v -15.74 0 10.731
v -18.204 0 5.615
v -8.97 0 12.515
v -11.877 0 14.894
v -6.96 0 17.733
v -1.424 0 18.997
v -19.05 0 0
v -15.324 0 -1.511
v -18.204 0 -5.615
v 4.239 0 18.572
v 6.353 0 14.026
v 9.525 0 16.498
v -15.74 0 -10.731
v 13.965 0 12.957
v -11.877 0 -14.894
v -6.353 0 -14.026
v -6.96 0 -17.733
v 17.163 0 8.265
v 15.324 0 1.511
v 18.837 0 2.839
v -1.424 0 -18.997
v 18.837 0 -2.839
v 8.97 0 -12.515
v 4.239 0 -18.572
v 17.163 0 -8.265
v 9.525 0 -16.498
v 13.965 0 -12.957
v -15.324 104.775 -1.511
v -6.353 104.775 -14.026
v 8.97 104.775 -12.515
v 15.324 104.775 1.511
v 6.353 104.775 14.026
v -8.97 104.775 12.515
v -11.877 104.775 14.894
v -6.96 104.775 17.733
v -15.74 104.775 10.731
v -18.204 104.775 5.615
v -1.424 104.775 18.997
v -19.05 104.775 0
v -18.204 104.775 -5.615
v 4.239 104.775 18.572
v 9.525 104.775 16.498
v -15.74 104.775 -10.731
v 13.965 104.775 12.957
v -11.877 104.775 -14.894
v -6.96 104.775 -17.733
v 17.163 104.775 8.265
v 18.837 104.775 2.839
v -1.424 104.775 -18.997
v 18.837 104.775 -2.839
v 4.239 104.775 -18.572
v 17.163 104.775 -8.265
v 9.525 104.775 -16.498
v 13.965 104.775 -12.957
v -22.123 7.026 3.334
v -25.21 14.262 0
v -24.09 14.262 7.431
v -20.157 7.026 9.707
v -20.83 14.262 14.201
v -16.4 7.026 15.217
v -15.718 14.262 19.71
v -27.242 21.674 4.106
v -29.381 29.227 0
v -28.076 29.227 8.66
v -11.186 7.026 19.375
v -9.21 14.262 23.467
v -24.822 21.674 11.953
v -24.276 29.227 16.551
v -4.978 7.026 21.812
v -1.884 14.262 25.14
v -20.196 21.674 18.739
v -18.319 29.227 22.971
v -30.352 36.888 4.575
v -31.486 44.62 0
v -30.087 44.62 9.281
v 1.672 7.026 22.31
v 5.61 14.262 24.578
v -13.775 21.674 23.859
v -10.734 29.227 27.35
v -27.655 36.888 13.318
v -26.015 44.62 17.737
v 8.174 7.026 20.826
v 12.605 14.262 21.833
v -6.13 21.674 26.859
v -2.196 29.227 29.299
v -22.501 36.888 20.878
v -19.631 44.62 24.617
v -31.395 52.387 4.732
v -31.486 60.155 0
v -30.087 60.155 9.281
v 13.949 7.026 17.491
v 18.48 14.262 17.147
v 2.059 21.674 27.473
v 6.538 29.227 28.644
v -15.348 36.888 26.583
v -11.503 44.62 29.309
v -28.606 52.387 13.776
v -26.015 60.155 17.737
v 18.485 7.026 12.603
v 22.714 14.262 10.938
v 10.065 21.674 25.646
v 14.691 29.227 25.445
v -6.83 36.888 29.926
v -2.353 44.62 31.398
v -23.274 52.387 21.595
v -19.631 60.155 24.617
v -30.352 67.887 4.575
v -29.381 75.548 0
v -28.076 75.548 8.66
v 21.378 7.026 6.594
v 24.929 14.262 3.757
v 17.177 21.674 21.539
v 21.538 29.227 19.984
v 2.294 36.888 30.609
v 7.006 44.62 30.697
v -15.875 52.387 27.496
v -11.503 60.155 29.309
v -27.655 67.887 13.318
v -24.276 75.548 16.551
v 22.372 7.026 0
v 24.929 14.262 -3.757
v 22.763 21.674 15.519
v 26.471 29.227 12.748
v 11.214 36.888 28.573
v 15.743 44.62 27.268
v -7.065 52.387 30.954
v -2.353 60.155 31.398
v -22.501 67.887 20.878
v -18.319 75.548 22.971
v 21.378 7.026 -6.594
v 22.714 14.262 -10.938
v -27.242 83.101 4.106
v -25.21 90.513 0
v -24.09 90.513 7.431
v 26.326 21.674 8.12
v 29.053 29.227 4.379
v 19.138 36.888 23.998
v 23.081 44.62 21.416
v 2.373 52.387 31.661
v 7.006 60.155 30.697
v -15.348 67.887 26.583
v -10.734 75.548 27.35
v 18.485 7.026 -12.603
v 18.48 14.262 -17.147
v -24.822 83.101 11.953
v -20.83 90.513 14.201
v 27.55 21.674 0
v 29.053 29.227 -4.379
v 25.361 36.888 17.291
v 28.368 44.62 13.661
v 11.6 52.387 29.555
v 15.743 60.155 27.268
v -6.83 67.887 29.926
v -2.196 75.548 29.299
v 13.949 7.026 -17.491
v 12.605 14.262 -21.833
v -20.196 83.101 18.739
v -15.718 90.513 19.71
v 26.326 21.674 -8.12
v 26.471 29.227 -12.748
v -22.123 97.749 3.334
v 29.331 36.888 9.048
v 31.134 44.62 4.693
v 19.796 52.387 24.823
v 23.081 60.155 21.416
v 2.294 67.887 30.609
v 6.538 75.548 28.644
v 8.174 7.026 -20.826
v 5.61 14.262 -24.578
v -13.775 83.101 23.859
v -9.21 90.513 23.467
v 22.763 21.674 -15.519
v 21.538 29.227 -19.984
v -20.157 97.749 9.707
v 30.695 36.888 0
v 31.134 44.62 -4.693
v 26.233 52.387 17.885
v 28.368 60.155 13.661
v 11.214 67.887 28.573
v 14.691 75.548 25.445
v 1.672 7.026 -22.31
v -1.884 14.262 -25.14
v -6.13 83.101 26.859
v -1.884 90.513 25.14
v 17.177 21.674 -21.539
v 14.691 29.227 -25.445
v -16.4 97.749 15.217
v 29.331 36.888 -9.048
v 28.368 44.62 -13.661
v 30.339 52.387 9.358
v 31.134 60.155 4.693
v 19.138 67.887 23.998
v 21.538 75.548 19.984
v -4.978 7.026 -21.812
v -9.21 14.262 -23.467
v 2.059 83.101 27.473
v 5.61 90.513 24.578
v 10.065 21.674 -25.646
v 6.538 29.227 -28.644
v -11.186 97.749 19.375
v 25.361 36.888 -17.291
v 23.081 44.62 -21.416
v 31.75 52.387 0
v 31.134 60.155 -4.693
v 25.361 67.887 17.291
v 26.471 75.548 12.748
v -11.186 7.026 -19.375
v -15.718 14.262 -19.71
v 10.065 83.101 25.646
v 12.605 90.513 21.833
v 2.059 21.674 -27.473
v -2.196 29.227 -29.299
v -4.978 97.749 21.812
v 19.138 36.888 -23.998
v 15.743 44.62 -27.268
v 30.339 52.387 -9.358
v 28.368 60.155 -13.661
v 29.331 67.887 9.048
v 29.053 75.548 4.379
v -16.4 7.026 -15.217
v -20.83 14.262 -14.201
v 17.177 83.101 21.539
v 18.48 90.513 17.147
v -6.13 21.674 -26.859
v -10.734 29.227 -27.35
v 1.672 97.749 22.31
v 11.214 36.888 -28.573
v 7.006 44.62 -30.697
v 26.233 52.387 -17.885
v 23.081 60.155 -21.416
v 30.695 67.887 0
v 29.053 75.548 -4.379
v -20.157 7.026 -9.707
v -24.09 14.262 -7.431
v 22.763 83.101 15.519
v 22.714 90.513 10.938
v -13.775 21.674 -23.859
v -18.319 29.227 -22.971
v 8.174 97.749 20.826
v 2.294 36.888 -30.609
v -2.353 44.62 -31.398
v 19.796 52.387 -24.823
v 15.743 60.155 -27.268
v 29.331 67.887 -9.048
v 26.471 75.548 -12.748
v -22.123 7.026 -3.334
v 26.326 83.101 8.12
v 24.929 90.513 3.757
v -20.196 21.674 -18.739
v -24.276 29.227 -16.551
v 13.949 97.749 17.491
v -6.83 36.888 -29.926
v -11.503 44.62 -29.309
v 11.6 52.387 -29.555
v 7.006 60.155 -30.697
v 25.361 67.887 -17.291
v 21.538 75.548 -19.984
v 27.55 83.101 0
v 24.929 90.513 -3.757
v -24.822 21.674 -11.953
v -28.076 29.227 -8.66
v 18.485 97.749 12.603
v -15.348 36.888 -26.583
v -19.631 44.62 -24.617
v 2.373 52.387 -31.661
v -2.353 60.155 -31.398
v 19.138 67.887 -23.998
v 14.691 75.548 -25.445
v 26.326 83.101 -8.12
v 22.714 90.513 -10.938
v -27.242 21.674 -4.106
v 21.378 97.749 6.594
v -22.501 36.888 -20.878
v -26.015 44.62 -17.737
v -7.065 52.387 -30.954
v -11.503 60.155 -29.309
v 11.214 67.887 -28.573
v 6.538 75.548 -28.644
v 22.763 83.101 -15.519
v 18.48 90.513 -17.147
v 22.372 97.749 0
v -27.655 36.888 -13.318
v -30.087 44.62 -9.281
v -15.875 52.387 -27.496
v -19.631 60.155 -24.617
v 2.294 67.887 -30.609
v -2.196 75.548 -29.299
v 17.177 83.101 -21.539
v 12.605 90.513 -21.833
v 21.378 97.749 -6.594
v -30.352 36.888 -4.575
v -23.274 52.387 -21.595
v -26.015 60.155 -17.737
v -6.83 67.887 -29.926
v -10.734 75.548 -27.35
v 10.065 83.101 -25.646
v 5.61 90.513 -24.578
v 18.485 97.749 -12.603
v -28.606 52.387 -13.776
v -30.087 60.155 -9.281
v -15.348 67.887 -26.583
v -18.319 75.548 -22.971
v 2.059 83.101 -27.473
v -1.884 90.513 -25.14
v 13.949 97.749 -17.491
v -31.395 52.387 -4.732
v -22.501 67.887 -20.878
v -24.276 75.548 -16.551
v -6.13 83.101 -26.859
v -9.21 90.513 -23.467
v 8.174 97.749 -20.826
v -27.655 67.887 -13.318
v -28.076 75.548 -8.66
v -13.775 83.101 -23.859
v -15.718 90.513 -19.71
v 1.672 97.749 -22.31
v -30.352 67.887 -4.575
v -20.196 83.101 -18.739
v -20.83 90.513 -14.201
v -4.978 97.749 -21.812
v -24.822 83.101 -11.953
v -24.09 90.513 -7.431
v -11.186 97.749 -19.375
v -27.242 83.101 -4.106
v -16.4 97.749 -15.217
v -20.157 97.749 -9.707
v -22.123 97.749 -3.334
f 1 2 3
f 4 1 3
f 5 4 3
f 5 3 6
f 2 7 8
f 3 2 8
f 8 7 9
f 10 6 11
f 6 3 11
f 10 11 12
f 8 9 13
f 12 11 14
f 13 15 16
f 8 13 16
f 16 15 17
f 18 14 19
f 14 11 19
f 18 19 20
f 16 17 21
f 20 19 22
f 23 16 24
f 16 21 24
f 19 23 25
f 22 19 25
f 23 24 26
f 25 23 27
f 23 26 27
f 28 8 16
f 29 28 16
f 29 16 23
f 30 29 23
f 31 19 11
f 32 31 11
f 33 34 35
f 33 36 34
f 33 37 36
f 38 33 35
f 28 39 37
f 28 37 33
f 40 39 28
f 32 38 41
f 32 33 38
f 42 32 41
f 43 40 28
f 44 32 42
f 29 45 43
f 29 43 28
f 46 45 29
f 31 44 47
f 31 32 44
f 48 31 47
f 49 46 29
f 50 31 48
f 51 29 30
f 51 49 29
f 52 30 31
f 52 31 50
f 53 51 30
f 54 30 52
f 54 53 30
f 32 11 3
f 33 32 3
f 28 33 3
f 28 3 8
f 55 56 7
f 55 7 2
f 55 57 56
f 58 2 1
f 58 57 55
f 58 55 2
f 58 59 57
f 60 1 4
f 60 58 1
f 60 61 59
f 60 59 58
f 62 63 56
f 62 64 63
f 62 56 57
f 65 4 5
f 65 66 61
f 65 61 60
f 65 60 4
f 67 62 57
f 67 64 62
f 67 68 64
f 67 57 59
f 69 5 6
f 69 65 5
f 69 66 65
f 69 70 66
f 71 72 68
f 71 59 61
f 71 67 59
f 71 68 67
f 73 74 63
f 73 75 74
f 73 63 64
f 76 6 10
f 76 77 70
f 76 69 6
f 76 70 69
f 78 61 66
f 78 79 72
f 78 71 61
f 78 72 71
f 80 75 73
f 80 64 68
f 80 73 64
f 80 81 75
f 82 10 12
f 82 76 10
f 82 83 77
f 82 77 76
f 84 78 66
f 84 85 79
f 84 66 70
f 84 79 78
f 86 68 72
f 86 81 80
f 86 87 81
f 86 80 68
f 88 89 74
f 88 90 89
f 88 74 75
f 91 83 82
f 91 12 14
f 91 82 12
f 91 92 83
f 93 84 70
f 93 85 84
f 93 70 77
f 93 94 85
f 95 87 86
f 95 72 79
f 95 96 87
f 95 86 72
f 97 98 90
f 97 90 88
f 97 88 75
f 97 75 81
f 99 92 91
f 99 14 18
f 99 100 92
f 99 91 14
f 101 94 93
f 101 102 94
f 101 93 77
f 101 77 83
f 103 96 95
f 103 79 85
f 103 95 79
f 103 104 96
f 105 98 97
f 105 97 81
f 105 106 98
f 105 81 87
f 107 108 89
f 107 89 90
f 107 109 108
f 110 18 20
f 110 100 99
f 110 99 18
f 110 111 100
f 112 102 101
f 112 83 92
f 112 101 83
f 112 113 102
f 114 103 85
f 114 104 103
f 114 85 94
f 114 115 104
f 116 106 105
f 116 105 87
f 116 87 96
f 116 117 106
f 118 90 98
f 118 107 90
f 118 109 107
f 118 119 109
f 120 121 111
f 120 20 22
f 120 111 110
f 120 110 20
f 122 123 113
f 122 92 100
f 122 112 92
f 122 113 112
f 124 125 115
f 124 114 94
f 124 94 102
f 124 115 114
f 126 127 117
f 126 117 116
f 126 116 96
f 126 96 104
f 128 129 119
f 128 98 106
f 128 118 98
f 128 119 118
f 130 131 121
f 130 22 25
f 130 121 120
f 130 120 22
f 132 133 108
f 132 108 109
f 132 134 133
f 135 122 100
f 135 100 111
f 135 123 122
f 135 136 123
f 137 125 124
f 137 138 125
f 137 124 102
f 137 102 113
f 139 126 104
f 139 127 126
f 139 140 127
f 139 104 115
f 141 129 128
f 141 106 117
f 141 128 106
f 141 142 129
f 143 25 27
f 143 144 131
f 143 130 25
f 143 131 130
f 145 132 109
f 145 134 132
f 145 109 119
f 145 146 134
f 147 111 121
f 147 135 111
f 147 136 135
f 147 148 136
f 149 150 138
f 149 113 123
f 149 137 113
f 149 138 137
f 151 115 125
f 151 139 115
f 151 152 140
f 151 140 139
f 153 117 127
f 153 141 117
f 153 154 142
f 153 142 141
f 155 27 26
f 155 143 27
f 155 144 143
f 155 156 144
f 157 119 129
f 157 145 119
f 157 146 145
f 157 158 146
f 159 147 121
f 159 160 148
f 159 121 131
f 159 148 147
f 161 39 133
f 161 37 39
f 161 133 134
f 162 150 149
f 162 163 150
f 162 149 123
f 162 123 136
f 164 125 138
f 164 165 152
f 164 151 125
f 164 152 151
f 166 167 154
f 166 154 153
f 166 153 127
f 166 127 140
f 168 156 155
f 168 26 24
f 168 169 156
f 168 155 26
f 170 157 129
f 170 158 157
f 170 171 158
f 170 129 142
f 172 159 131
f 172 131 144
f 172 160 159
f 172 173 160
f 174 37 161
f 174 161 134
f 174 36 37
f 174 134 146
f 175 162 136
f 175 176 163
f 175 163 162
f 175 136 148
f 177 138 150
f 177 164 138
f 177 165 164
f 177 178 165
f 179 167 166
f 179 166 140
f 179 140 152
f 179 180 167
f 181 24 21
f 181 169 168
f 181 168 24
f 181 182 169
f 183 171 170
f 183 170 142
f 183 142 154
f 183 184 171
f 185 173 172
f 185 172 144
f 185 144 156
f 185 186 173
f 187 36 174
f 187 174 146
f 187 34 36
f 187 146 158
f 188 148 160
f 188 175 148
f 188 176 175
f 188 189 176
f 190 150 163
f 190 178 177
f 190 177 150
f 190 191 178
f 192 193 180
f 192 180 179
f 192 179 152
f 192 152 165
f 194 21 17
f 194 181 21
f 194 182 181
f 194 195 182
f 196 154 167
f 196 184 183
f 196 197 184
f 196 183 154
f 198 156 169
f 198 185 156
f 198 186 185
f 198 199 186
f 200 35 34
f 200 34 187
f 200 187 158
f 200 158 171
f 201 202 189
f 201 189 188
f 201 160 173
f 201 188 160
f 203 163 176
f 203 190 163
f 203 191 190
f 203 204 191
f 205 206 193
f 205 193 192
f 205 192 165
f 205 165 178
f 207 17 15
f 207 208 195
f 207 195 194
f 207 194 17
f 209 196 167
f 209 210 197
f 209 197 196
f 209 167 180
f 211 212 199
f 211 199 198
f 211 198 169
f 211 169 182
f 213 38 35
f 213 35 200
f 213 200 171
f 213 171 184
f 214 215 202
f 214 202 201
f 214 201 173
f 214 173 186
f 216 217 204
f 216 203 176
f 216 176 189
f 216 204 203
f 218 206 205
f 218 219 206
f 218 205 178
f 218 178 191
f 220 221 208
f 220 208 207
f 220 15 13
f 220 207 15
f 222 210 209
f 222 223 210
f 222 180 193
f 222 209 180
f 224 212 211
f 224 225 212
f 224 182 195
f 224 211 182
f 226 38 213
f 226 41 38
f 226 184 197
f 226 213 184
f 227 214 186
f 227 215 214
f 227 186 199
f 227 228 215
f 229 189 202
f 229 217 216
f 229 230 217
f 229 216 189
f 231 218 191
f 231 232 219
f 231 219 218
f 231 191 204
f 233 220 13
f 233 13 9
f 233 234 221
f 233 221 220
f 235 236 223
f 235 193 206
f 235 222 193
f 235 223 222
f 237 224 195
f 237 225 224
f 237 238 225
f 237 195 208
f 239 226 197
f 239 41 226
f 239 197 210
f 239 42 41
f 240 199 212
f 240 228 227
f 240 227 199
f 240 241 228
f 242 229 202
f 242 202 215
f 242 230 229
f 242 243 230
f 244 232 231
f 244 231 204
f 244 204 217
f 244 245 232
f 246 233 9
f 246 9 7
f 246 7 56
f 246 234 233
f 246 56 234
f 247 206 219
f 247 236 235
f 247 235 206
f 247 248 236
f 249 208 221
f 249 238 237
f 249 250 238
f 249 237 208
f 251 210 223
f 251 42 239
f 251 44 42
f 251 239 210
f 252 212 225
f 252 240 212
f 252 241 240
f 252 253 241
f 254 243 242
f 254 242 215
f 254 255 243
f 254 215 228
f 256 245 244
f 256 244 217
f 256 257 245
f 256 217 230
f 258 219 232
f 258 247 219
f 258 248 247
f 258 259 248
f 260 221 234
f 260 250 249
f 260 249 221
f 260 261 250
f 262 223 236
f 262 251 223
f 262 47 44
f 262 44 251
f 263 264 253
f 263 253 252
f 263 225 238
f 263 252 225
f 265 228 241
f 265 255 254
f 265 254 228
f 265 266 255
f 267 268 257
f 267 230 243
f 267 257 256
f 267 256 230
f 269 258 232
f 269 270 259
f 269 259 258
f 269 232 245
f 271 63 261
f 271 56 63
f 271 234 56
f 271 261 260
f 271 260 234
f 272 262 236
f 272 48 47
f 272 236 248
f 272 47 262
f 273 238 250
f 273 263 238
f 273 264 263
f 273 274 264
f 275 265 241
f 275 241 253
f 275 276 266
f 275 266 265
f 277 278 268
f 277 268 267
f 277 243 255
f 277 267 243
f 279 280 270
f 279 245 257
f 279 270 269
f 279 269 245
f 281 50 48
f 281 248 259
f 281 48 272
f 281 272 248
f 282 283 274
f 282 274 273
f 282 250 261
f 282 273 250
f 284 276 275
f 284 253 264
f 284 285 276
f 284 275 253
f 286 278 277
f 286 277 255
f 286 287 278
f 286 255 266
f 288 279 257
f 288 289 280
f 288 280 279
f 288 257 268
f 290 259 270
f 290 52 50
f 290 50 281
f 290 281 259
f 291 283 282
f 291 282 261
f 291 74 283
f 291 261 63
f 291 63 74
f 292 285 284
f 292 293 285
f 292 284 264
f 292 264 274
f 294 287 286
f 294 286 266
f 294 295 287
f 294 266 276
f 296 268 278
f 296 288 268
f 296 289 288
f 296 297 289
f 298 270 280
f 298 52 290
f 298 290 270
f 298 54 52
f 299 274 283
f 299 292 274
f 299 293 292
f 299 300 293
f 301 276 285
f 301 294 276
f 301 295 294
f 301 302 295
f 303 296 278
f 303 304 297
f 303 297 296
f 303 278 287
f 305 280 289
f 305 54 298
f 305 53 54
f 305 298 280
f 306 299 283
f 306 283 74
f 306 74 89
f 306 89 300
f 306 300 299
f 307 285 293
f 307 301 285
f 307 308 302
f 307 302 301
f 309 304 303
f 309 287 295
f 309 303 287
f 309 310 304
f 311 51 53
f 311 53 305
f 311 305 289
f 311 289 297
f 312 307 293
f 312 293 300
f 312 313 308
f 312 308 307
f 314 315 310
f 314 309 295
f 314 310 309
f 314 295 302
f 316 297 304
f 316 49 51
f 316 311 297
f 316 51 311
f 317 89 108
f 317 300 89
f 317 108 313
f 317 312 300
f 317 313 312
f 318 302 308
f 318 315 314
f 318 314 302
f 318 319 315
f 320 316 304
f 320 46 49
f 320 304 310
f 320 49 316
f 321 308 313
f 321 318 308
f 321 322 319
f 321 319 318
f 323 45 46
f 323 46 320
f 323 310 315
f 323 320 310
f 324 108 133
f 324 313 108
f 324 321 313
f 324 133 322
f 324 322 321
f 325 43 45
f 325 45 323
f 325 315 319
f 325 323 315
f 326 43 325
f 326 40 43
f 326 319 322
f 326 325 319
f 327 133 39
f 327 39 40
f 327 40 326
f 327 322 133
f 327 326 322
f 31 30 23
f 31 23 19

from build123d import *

# Parameters (mm, degrees)
SKETCH1_R           = 19.05
BOSS_EXTRUDE1_DEPTH = 104.775
CUT_EXTRUDE1_DEPTH  = 104.775


with BuildPart() as part:
    # Sketch1 → Boss-Extrude1 (new body)
    with BuildSketch(Plane(origin=(0, 0, 0), x_dir=(1, 0, 0), z_dir=(0, 1, 0))):
        Circle(SKETCH1_R)
    extrude(amount=BOSS_EXTRUDE1_DEPTH)

    # Sketch2 → Cut-Extrude1 (cut)
    with BuildSketch(Plane.XZ):
        Polygon((-15.323636661, -1.510781079), (-6.353443536, -14.026049167), (8.970193125, -12.515268087), (15.323636661, 1.510781079), (6.353443536, 14.026049167), (-8.970193125, 12.515268087), align=None)
    extrude(amount=-CUT_EXTRUDE1_DEPTH, mode=Mode.SUBTRACT)

    # Sketch4 → Revolve1 (revolve)
    with BuildSketch(Plane.XY):
        with BuildLine():
            Line((-19.05, 104.775), (-19.05, 0))
            ThreePointArc((-19.05, 0), (-31.75, 52.3875), (-19.05, 104.775))
        make_face()
    revolve(axis=Axis((0, 0, 0), (0, 1, 0)))


solid = part.part
